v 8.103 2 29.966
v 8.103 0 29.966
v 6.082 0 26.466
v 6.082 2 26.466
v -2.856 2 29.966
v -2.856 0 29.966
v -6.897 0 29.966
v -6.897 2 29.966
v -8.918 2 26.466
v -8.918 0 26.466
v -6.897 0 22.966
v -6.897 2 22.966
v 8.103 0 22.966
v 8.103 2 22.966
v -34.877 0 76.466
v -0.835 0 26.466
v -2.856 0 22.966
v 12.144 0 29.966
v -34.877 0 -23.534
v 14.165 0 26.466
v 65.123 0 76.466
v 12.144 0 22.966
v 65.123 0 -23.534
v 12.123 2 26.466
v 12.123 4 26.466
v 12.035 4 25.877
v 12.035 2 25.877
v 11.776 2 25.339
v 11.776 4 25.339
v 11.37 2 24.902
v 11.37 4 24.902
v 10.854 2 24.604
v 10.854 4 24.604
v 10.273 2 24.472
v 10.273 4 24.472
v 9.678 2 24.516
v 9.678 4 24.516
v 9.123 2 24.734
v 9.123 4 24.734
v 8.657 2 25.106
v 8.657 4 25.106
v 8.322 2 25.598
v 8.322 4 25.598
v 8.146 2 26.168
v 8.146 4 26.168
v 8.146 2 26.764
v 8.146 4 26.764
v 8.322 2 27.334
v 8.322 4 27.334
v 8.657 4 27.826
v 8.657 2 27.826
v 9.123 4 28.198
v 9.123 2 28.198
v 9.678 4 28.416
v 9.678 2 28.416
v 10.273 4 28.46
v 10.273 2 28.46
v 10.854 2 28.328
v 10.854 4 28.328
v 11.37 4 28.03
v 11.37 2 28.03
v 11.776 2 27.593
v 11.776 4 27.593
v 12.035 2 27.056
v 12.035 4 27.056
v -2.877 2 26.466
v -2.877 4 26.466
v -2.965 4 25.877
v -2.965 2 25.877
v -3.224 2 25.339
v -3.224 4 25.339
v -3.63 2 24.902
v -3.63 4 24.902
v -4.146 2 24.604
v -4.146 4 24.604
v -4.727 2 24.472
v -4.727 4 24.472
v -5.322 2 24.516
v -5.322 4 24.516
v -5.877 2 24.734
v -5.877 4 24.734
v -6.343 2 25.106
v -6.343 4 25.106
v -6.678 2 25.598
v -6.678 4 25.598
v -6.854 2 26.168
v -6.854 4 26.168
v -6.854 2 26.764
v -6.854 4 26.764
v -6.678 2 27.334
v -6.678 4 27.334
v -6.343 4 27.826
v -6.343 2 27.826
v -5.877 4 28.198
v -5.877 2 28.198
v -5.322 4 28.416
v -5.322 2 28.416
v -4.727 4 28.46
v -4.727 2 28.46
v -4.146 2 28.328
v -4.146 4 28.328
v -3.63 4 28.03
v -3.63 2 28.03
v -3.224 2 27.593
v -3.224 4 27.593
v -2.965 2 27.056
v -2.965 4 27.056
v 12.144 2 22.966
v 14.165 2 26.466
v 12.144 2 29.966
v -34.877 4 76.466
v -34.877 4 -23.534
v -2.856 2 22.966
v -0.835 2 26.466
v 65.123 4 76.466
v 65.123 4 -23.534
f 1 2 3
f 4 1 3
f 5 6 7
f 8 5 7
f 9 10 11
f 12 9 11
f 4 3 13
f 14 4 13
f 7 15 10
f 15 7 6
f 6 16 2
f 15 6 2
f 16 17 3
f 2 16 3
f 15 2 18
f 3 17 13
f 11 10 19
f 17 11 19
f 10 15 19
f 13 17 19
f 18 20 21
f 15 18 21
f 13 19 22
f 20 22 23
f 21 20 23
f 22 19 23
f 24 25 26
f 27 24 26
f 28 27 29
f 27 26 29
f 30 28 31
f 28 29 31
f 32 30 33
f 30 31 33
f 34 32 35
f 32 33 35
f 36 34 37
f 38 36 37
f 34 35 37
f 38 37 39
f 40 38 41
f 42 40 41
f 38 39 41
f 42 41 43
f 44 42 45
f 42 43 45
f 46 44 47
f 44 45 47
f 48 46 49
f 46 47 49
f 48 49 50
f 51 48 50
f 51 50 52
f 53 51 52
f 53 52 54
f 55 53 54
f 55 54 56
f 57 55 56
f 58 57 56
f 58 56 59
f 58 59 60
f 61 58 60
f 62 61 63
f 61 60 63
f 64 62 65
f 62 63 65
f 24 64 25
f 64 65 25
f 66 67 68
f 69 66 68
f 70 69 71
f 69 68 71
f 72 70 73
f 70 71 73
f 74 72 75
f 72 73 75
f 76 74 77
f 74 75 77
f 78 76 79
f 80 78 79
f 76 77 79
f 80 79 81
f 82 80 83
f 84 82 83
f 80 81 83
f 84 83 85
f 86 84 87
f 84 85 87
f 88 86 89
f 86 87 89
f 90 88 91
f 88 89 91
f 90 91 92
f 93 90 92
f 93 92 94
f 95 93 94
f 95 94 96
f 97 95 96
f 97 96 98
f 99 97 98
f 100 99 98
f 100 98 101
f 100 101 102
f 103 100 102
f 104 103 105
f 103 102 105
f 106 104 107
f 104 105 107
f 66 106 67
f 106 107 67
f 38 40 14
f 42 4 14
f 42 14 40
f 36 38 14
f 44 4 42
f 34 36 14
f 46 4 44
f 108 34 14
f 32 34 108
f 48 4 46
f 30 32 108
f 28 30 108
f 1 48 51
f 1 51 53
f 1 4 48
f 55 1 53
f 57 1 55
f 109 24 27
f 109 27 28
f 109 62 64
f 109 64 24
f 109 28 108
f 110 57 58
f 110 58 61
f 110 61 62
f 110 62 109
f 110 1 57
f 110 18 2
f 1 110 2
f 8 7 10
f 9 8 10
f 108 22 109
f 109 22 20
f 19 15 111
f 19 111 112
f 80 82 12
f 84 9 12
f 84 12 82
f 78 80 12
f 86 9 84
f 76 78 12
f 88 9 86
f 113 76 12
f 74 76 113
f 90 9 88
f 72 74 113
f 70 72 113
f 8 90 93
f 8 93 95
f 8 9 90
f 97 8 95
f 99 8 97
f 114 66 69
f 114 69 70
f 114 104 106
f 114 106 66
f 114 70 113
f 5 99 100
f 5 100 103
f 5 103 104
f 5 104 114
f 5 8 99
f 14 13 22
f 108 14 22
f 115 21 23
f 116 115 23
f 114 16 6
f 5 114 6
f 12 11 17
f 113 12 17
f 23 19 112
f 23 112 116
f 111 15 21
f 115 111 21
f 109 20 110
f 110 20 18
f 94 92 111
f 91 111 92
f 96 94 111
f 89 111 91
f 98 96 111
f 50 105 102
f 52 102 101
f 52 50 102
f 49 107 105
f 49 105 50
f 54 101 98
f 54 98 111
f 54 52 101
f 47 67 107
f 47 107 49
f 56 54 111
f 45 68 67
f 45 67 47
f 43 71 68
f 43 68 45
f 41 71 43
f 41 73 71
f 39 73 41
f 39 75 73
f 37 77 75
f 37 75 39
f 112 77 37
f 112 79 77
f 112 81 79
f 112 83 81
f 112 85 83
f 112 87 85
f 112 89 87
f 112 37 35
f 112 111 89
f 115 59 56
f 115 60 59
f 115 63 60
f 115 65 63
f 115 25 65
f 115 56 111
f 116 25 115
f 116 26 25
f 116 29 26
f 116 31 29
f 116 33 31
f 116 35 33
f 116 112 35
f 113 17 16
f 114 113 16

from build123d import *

# Parameters (mm, degrees)
SKETCH1_W           = 100
SKETCH1_H           = 100
BOSS_EXTRUDE1_DEPTH = 4
SKETCH3_R           = 2
CUT_EXTRUDE1_DEPTH  = 2
CUT_EXTRUDE2_DEPTH  = 2


with BuildPart() as part:
    # Sketch1 → Boss-Extrude1 (new body)
    with BuildSketch(Plane(origin=(0, 0, 0), x_dir=(1, 0, 0), z_dir=(0, 1, 0))):
        with Locations((15.12345679, -26.466049383)):
            Rectangle(SKETCH1_W, SKETCH1_H)
    extrude(amount=BOSS_EXTRUDE1_DEPTH)

    # Sketch3 → Cut-Extrude1 (cut)
    with BuildSketch(Plane(origin=(0, 4, 0), x_dir=(1, 0, 0), z_dir=(0, 1, 0))):
        with Locations((-4.87654321, -26.466049383)):
            Circle(SKETCH3_R)
        with Locations((10.12345679, -26.466049383)):
            Circle(SKETCH3_R)
    extrude(amount=-CUT_EXTRUDE1_DEPTH, mode=Mode.SUBTRACT)

    # Sketch5 → Cut-Extrude2 (cut)
    with BuildSketch(Plane.XZ):
        Polygon((-0.835091326, 26.466049383), (-2.855817268, 29.966049383), (-6.897269152, 29.966049383), (-8.917995094, 26.466049383), (-6.897269152, 22.966049383), (-2.855817268, 22.966049383), align=None)
        Polygon((14.164908674, 26.466049383), (12.144182732, 29.966049383), (8.102730848, 29.966049383), (6.082004906, 26.466049383), (8.102730848, 22.966049383), (12.144182732, 22.966049383), align=None)
    extrude(amount=-CUT_EXTRUDE2_DEPTH, mode=Mode.SUBTRACT)


solid = part.part
